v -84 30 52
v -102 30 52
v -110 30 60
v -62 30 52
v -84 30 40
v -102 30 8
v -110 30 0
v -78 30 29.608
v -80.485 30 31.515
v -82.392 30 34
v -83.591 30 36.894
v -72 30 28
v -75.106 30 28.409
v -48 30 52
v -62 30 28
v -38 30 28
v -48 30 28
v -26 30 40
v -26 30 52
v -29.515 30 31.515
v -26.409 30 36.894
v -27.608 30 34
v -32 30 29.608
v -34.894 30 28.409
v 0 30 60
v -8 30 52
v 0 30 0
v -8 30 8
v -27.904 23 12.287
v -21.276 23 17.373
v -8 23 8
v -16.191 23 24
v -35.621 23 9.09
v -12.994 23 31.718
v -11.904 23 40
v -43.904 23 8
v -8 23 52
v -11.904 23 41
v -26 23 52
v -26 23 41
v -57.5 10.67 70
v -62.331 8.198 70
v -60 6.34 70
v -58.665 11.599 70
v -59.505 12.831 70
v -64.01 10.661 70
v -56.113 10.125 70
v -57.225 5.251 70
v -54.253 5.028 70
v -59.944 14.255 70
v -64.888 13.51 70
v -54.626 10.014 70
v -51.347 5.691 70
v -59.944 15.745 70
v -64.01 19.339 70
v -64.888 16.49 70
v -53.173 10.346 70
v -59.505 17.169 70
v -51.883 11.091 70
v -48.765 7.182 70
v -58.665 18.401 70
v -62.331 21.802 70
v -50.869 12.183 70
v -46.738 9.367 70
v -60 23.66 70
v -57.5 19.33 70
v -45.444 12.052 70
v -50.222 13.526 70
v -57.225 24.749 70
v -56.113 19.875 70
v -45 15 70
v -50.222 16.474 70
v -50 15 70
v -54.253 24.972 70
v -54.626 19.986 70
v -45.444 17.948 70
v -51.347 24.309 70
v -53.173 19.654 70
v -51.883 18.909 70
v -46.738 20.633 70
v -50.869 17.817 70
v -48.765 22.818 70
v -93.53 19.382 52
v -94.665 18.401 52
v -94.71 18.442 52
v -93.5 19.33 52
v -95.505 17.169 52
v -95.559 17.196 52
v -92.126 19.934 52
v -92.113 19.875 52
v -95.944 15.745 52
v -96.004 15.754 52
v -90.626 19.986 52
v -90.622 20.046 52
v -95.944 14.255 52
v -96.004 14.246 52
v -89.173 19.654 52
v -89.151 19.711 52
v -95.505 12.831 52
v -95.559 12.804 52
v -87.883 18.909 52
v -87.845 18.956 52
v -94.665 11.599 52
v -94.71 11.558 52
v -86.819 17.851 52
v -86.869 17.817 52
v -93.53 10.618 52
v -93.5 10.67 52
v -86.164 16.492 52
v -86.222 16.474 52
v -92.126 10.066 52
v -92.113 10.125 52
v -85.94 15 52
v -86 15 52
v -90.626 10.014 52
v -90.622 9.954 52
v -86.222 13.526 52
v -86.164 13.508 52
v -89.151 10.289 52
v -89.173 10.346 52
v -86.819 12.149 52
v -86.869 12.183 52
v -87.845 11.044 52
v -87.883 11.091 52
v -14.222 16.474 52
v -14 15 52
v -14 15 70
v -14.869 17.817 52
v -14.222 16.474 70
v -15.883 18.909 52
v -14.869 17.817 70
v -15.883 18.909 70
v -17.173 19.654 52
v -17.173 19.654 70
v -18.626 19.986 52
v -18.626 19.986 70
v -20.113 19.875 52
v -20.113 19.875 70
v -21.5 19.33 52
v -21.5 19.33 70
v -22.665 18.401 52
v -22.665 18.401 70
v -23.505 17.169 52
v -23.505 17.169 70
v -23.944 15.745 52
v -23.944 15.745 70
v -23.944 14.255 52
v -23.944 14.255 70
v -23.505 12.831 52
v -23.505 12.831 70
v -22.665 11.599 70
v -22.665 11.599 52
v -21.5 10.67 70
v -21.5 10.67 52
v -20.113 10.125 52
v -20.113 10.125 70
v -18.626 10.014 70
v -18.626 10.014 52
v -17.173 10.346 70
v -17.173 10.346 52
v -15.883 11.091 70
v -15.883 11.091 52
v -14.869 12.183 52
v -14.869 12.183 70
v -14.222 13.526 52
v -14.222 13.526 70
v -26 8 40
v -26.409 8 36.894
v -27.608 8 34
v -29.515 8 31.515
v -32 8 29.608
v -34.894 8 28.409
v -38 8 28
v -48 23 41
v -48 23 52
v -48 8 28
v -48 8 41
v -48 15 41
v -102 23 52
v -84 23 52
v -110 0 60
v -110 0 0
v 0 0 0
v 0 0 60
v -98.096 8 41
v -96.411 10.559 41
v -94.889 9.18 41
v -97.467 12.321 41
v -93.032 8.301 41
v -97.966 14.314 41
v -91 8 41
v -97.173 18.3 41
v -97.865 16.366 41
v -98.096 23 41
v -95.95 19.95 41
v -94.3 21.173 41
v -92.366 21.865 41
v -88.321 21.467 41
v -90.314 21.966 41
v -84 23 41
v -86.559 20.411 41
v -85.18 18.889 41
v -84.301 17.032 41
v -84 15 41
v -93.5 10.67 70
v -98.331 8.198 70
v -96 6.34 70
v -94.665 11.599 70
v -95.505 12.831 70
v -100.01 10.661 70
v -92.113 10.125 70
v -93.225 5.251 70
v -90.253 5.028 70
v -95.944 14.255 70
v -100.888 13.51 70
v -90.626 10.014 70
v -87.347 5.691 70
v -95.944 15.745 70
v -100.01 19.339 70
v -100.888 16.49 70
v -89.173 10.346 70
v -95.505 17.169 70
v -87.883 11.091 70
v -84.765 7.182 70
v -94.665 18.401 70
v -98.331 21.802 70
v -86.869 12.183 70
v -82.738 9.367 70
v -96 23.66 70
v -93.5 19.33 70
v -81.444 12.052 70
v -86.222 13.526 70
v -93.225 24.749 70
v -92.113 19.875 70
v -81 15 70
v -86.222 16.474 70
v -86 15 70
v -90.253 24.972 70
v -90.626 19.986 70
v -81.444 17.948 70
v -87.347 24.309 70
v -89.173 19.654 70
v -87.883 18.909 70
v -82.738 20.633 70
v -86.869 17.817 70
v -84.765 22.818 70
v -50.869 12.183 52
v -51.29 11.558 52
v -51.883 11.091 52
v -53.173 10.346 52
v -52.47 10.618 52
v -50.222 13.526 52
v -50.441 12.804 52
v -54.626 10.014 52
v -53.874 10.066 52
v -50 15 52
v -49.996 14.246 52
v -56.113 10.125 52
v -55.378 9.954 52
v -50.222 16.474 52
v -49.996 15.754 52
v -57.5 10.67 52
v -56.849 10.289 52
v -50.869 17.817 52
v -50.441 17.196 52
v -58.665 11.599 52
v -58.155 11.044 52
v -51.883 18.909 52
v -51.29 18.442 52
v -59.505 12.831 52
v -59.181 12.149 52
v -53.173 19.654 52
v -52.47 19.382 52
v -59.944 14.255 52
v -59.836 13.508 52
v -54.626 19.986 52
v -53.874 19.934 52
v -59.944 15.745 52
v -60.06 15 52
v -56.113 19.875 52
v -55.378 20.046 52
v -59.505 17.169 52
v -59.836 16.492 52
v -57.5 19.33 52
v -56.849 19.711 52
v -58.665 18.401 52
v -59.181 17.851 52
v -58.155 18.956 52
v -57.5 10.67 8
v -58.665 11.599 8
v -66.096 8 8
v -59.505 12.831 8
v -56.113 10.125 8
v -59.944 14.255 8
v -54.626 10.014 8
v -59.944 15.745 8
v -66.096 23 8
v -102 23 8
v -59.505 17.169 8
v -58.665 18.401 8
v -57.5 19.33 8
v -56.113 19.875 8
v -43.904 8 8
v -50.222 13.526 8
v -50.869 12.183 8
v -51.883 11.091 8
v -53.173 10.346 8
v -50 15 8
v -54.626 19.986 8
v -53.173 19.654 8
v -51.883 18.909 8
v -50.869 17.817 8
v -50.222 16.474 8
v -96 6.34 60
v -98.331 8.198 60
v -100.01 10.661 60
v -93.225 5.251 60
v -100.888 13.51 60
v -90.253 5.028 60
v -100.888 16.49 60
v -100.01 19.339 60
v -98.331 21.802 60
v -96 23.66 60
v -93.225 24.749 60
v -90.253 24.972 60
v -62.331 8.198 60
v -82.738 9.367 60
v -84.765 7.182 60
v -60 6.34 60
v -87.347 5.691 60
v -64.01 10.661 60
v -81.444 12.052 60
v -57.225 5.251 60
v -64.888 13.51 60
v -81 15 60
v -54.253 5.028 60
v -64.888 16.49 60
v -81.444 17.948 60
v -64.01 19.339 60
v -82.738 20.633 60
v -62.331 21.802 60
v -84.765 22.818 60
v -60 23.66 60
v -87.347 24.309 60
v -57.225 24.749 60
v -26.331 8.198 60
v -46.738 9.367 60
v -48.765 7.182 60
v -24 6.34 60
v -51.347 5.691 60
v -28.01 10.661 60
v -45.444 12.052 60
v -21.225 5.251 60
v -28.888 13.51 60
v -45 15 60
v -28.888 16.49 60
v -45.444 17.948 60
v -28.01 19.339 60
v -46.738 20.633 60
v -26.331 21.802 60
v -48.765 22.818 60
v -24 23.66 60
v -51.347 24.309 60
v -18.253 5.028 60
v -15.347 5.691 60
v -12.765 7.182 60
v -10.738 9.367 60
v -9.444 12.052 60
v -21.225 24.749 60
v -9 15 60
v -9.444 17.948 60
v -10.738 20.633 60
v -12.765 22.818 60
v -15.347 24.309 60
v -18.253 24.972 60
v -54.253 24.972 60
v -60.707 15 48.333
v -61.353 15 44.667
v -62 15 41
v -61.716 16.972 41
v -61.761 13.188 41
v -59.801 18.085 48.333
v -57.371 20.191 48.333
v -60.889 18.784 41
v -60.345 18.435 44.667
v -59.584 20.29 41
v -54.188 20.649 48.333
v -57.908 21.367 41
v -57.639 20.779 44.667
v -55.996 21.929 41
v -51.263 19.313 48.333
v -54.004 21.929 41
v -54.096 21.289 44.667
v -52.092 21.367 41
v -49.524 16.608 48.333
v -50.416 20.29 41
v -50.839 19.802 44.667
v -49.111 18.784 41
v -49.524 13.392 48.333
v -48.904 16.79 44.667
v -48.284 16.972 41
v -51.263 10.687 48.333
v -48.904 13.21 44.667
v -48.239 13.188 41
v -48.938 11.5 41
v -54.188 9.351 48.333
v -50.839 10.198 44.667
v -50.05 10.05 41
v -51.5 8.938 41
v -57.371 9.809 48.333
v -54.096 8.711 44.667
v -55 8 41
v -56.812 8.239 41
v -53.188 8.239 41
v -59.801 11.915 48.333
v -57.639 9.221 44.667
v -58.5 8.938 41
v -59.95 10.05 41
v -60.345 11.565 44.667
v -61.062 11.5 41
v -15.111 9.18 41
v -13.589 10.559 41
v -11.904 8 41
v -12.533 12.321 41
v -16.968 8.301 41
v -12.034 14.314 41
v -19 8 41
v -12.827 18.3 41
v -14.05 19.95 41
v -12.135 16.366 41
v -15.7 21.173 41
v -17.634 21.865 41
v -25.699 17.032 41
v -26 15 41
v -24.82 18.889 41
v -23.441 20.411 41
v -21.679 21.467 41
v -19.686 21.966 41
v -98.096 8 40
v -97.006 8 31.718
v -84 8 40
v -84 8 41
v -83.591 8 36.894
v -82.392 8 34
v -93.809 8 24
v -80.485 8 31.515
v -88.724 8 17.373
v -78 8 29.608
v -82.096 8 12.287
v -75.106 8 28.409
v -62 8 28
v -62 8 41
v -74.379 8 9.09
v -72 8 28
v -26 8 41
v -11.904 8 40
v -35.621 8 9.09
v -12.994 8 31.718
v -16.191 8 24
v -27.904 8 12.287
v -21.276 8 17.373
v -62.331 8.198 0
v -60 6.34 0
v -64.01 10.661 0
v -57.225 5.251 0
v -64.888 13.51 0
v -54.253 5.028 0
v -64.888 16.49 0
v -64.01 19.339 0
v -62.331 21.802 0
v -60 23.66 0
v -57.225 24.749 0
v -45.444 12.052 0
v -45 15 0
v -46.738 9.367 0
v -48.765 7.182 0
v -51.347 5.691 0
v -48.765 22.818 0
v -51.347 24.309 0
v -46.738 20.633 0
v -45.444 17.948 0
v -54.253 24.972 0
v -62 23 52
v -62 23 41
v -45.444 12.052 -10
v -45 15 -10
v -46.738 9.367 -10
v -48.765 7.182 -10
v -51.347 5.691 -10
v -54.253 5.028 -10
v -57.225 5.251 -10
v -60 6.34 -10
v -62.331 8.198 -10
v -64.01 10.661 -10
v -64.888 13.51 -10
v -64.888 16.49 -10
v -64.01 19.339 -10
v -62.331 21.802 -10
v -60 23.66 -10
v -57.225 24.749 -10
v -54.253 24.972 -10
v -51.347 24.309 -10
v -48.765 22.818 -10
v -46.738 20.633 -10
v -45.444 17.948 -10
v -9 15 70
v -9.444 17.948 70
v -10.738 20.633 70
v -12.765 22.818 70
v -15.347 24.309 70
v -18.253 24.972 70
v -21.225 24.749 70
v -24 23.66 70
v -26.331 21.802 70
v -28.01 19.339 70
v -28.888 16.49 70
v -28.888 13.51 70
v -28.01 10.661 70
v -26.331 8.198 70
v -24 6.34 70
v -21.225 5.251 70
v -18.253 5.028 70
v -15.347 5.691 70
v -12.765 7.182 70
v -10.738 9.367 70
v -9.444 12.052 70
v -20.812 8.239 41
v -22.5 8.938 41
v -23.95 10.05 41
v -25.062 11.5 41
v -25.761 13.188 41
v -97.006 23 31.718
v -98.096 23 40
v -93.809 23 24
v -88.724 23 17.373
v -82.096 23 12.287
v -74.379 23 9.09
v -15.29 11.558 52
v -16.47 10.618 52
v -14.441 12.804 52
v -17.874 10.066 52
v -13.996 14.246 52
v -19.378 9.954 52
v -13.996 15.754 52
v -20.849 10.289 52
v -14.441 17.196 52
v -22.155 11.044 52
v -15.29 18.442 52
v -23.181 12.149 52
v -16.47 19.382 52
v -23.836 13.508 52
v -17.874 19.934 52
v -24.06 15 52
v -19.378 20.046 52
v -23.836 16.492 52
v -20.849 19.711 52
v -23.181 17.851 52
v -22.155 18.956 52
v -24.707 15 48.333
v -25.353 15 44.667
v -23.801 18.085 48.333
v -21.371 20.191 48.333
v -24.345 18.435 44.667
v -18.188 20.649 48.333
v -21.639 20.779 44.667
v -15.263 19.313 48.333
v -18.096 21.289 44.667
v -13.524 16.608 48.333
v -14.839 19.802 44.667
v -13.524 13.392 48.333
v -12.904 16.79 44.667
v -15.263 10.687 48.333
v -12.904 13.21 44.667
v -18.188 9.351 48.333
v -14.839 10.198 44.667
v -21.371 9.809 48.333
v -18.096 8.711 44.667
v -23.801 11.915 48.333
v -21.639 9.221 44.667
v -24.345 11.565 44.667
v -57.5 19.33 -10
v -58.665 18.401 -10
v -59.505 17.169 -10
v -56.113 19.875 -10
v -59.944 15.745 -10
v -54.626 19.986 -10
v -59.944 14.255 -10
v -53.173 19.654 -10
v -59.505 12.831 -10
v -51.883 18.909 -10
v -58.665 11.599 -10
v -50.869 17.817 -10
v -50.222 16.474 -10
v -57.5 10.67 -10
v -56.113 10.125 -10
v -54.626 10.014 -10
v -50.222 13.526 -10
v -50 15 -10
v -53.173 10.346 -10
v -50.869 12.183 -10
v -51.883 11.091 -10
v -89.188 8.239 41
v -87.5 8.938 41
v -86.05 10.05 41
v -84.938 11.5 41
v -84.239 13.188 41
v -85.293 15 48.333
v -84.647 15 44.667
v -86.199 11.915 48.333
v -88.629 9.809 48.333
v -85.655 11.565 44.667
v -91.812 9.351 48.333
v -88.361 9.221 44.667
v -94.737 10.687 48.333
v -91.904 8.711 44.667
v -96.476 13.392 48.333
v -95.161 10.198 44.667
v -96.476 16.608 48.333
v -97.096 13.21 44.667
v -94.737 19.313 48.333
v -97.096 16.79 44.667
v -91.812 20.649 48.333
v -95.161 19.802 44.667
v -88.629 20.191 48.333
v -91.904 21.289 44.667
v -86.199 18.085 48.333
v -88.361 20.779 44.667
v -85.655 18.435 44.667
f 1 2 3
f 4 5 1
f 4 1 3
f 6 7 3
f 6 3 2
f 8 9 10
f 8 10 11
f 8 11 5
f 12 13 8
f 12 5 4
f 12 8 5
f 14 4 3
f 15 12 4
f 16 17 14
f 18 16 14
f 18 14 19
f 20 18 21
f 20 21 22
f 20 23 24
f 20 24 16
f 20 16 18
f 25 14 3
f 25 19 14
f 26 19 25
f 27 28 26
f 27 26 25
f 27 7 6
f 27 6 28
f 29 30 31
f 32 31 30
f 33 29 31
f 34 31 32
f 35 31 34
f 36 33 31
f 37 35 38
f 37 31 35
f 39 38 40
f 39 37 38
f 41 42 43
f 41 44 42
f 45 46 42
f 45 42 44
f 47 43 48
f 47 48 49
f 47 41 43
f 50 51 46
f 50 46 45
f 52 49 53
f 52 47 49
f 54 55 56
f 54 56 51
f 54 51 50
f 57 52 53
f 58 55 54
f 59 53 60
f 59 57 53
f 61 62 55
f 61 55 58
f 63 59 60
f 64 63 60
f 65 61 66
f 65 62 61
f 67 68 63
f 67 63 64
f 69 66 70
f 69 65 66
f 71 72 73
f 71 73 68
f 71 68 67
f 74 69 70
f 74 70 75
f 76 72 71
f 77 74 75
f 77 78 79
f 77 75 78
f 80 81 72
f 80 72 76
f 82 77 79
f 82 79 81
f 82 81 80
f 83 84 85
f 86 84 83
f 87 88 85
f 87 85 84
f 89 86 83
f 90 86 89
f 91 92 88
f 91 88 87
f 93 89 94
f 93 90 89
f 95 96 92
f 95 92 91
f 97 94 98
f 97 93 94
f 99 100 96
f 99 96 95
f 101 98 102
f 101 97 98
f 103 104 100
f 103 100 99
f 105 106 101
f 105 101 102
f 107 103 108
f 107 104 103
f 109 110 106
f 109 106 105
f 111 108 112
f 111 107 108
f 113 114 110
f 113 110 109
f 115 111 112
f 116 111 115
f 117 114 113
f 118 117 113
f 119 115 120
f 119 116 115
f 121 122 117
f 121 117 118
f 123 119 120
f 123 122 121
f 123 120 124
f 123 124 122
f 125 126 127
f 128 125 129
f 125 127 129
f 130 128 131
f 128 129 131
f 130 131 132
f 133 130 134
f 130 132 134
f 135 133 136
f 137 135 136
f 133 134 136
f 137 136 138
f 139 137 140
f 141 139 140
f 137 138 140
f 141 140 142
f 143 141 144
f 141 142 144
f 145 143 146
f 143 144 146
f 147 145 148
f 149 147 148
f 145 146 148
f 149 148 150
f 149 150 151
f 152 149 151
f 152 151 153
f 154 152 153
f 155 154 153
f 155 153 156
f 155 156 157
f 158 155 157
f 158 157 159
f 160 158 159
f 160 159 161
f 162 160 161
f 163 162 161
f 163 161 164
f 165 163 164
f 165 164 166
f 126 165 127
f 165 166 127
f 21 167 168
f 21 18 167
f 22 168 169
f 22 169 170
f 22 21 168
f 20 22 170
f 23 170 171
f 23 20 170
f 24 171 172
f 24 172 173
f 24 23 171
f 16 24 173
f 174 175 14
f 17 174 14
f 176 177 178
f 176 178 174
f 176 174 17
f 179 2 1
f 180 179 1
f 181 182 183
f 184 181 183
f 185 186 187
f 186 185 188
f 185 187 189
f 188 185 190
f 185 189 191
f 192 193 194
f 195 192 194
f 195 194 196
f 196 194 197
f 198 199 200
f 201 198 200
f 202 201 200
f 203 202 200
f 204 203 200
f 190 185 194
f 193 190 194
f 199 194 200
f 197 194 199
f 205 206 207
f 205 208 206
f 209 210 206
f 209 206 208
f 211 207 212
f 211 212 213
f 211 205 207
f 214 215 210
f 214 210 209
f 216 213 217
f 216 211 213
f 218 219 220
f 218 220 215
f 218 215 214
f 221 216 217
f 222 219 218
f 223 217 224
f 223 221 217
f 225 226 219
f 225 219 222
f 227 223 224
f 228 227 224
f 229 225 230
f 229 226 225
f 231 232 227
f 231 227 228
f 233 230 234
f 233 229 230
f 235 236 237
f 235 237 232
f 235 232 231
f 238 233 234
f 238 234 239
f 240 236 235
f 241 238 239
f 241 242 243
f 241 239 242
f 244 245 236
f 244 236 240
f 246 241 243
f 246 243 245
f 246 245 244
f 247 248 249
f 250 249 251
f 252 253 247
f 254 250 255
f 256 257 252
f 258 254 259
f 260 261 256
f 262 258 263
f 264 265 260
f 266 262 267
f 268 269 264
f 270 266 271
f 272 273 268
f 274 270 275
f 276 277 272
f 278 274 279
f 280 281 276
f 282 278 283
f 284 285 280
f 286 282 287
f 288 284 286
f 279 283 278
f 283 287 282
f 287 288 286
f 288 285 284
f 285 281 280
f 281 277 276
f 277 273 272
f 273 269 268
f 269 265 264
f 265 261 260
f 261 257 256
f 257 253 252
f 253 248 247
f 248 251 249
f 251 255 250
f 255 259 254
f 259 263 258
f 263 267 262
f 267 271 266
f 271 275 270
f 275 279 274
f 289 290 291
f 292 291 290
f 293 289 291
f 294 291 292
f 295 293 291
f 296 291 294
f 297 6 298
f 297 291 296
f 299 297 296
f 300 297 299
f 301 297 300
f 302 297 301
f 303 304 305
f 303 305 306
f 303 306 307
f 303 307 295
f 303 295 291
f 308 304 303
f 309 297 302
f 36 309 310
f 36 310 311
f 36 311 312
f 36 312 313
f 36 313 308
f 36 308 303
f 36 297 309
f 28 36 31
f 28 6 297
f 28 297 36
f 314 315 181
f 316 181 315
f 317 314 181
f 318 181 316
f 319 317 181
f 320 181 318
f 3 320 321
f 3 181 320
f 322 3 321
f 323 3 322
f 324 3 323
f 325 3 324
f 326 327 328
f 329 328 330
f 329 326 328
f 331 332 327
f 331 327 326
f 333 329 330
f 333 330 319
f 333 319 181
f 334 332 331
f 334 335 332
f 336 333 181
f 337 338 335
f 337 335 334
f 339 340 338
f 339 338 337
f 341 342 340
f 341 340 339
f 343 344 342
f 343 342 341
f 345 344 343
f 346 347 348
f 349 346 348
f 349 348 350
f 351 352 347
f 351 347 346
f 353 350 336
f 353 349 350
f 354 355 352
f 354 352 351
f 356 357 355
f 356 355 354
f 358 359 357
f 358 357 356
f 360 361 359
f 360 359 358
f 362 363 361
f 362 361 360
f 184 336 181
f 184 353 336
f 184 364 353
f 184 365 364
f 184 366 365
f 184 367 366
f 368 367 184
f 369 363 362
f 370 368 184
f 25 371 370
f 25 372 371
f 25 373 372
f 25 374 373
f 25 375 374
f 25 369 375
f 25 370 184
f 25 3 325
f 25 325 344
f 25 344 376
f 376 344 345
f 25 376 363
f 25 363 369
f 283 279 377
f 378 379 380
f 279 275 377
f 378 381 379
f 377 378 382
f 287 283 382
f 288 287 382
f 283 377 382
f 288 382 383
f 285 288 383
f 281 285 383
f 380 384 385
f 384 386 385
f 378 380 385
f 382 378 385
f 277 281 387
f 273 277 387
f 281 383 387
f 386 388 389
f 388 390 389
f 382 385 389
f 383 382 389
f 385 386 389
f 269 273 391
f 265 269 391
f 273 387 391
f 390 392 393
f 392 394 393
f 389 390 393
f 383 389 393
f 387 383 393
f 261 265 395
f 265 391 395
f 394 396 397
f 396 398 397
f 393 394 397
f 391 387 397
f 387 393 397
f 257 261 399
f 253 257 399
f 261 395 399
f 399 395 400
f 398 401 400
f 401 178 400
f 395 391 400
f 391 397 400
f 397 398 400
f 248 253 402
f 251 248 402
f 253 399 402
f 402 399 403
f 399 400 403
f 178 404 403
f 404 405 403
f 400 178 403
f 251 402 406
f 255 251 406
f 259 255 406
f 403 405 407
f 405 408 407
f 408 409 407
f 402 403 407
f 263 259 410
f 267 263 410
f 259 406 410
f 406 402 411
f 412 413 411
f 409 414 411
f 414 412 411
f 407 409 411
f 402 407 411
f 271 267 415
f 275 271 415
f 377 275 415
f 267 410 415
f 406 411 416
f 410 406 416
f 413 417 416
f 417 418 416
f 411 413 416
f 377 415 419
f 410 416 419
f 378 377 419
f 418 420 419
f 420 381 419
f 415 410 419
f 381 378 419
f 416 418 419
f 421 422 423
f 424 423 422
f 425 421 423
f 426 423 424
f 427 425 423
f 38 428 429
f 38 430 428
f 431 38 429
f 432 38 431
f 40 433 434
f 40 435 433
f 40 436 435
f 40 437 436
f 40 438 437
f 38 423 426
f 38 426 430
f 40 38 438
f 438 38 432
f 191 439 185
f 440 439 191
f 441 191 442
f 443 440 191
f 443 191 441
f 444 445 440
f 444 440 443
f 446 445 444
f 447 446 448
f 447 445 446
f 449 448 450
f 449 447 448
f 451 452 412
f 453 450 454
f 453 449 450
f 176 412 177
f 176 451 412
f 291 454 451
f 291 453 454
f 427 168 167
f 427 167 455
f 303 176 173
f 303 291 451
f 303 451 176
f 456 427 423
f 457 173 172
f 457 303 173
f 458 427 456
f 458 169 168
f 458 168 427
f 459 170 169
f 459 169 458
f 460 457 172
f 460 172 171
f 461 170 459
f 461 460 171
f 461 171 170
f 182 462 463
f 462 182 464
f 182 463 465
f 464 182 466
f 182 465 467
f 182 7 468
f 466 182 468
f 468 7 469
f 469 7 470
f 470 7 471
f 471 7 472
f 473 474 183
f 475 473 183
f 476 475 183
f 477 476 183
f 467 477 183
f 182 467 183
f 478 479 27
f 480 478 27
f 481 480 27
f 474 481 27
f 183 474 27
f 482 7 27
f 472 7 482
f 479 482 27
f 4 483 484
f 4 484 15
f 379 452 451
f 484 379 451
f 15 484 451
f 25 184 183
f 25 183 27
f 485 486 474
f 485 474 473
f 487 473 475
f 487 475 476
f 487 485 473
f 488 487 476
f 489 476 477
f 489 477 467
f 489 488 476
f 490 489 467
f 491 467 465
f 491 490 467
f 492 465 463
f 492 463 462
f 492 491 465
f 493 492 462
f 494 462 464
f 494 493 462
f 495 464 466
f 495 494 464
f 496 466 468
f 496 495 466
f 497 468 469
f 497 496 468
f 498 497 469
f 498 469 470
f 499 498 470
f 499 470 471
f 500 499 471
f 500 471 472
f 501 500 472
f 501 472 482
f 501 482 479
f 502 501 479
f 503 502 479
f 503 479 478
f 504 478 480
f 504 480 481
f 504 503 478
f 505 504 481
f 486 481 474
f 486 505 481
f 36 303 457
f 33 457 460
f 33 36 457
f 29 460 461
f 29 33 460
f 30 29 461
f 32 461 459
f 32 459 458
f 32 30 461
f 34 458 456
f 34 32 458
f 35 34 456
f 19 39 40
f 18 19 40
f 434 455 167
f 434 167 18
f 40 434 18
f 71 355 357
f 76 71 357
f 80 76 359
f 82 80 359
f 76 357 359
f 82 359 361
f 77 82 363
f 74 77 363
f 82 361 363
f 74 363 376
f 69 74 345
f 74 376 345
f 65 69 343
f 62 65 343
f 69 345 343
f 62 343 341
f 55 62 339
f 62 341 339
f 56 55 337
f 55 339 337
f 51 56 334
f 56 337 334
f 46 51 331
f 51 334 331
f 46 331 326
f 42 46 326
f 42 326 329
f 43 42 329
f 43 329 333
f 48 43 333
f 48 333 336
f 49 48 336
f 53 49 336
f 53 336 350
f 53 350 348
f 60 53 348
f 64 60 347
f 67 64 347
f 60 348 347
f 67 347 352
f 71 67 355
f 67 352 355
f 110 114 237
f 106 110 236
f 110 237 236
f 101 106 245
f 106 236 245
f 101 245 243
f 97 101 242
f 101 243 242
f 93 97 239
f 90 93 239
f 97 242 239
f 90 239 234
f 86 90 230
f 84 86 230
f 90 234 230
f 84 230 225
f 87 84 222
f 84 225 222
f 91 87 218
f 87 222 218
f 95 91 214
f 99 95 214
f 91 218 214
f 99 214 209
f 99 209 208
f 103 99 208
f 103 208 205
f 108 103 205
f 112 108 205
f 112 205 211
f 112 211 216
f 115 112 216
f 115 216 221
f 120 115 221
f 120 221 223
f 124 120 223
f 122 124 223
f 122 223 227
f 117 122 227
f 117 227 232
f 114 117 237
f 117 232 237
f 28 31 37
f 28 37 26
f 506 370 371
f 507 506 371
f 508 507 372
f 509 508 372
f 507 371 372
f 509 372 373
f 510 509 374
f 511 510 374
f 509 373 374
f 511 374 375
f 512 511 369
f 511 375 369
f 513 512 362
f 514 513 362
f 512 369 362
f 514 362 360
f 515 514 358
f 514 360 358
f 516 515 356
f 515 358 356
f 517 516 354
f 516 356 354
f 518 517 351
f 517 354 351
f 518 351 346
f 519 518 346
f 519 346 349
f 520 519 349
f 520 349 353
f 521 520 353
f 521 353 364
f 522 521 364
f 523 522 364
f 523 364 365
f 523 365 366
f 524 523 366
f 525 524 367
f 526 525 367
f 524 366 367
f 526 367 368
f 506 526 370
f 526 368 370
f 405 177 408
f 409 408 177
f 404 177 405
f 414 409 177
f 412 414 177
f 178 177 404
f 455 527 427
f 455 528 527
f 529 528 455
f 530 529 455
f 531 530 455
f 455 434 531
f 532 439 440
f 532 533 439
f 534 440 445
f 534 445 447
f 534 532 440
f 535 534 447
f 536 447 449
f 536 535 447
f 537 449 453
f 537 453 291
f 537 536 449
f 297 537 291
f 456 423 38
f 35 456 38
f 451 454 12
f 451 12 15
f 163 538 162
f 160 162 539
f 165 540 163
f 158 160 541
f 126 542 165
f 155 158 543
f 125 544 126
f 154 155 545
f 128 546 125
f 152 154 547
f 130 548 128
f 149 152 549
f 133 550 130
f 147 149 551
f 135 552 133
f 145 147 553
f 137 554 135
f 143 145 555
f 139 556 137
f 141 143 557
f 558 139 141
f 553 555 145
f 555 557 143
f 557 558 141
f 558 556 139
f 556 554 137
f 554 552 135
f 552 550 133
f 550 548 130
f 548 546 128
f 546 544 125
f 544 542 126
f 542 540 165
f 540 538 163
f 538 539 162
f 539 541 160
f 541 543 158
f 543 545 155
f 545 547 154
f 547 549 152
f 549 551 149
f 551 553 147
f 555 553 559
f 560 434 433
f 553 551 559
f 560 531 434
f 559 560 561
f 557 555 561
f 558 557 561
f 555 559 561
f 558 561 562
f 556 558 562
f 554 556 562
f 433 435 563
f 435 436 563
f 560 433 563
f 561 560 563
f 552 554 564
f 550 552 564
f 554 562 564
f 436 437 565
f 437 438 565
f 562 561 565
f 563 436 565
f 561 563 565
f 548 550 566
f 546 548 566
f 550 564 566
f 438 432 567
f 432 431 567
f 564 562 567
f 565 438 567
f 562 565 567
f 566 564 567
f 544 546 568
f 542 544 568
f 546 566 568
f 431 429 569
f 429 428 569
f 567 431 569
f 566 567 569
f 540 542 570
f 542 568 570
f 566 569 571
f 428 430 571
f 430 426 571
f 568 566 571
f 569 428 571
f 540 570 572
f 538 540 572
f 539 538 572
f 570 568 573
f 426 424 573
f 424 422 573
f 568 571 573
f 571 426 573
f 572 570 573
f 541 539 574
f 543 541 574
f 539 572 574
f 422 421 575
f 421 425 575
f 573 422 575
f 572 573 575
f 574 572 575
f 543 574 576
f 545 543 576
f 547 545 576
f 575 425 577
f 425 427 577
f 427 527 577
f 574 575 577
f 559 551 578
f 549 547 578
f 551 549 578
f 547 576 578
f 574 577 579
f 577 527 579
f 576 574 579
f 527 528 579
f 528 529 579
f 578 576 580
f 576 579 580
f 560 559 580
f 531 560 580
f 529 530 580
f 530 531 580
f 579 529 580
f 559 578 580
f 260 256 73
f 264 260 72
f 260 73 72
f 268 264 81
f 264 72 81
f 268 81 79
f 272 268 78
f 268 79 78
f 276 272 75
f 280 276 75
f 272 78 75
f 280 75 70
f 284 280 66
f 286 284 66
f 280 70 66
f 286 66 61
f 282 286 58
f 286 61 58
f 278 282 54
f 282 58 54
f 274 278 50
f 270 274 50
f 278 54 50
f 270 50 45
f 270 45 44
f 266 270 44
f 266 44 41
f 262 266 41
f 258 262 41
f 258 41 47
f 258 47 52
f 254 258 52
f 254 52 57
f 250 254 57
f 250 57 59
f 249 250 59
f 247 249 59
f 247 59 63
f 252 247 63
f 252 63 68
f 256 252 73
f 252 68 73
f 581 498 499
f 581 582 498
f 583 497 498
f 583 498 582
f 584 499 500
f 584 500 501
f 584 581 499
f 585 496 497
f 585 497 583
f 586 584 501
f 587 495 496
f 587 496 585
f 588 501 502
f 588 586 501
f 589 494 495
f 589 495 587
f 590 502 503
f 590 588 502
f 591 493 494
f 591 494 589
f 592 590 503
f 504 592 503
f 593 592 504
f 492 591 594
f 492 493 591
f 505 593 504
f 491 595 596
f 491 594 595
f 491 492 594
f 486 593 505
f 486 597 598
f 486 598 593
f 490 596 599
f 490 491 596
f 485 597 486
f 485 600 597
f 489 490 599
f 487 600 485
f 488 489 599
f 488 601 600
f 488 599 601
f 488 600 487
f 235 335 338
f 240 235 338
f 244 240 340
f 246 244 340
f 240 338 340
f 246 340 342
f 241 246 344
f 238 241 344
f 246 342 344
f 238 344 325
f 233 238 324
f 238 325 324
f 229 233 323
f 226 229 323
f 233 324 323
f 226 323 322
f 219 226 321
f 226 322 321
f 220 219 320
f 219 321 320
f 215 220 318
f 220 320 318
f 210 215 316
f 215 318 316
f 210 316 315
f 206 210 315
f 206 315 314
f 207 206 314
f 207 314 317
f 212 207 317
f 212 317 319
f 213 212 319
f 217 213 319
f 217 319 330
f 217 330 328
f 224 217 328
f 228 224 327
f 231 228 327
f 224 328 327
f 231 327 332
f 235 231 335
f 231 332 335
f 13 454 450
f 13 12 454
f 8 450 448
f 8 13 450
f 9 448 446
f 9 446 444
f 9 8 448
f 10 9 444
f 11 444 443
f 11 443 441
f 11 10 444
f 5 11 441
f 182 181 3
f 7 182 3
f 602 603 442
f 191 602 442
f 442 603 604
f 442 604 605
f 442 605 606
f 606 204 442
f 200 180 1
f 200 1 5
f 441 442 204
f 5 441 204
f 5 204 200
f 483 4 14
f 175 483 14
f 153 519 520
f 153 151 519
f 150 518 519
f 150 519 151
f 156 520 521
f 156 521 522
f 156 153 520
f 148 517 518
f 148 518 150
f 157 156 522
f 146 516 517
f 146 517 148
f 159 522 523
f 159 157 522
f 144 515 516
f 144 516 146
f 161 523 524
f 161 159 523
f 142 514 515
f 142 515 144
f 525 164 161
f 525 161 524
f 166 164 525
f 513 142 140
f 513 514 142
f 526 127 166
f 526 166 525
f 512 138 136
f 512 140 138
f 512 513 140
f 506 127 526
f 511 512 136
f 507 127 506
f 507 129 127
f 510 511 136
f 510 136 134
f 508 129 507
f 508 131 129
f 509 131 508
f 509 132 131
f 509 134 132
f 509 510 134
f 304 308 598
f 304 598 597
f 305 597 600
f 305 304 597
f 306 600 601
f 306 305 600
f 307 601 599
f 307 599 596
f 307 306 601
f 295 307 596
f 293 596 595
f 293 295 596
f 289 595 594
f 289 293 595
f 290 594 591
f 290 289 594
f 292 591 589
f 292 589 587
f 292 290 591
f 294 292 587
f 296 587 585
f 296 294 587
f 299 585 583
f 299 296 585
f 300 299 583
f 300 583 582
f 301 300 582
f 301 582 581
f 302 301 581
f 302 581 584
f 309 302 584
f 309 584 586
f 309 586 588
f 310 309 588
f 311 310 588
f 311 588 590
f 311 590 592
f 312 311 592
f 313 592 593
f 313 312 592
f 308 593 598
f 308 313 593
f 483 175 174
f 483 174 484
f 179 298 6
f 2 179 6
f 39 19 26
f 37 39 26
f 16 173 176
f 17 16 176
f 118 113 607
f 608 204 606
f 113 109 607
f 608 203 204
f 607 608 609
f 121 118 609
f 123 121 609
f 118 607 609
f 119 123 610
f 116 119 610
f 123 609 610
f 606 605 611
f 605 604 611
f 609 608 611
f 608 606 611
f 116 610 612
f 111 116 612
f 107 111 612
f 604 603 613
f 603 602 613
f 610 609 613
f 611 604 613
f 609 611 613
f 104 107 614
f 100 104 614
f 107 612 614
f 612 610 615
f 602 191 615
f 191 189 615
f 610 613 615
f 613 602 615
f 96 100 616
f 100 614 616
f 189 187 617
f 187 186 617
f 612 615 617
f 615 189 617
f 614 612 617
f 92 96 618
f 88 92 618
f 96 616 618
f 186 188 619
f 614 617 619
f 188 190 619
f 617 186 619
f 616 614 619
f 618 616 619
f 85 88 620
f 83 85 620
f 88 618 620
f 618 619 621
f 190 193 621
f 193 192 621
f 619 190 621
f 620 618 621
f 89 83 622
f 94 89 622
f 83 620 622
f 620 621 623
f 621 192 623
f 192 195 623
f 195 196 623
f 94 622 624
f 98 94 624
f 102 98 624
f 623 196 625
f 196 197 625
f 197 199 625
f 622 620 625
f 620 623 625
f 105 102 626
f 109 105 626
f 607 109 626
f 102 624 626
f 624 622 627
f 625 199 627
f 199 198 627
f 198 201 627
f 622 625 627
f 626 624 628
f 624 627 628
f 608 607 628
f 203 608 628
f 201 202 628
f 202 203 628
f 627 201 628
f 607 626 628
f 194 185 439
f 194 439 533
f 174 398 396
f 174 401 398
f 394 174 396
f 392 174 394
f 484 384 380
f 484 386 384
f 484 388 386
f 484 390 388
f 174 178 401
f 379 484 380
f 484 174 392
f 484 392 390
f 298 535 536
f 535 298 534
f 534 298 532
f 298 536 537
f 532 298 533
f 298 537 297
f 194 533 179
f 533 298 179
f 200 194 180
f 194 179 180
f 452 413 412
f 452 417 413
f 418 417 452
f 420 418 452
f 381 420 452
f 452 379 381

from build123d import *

# Parameters (mm, degrees)
SKETCH1_W               = 110
SKETCH1_H               = 30
BOSS_EXTRUDE1_DEPTH     = 60
SKETCH5_R               = 10
BOSS_EXTRUDE3_DEPTH     = 10
SKETCH8_R               = 5
CUT_EXTRUDE2_DEPTH      = 18
BOSS_EXTRUDE4_START     = 10
SKETCH6_R               = 10
BOSS_EXTRUDE4_DEPTH     = 10
CUT_EXTRUDE3_START      = -18
SKETCH7_R               = 5
CUT_EXTRUDE3_DEPTH      = 18
SHELL6_START            = 8
SHELL6_OUTLINE_W        = 94
SHELL6_OUTLINE_H        = 22
SHELL6_DEPTH            = 44
SKETCH9_W               = 22
SKETCH9_H               = 24
BOSS_EXTRUDE5_DEPTH     = 22
FILLET2_R               = 12
SKETCH12_W              = 14
SKETCH12_H              = 16
BOSS_EXTRUDE8_DEPTH     = 11
SKETCH13_R              = 7
CUT_EXTRUDE4_DEPTH      = 11
CUT_EXTRUDE4_DRAFT      = -10
SKETCH14_W              = 18
SKETCH14_H              = 15
BOSS_EXTRUDE9_DEPTH     = 11
SKETCH16_R              = 7
CUT_EXTRUDE5_DEPTH      = 11
CUT_EXTRUDE5_DRAFT      = -10
SKETCH19_W              = 3.903707596
SKETCH19_H              = 15
BOSS_EXTRUDE11_DEPTH    = 33.5
FILLET3_R               = 32
MIRROR5_COPY_1_SKETCH_R = 7
MIRROR5_COPY_1_DEPTH    = 11
MIRROR5_COPY_1_DRAFT    = -10
FILLET3_OF_MIRROR5_R    = 32


# Read off the part's stored shape, not the designer's step: Shell6
with BuildPart() as part:
    # Sketch1 → Boss-Extrude1 (new body)
    with BuildSketch(Plane.XY):
        with Locations((-55, 15)):
            Rectangle(SKETCH1_W, SKETCH1_H)
    extrude(amount=BOSS_EXTRUDE1_DEPTH)

    # Sketch5 → Boss-Extrude3 (add)
    with BuildSketch(Plane.XY.offset(60)):
        with Locations((-91, 15)):
            Circle(SKETCH5_R)
        with Locations((-55, 15)):
            Circle(SKETCH5_R)
        with Locations((-19, 15)):
            Circle(SKETCH5_R)
    extrude(amount=BOSS_EXTRUDE3_DEPTH)

    # Sketch8 → Cut-Extrude2 (cut)
    with BuildSketch(Plane.XY.offset(70)):
        with Locations((-91, 15)):
            Circle(SKETCH8_R)
        with Locations((-55, 15)):
            Circle(SKETCH8_R)
        with Locations((-19, 15)):
            Circle(SKETCH8_R)
    extrude(amount=-CUT_EXTRUDE2_DEPTH, mode=Mode.SUBTRACT)

    # Sketch6 → Boss-Extrude4 (add)
    with BuildSketch(Plane(origin=(0, 0, 0), x_dir=(-1, 0, 0), z_dir=(0, 0, -1)).offset(BOSS_EXTRUDE4_START)):
        with Locations(Location((55, 15, 0), (0, 0, 180))):
            Circle(SKETCH6_R)
    extrude(amount=-BOSS_EXTRUDE4_DEPTH)

    # Sketch7 → Cut-Extrude3 (cut)
    with BuildSketch(Plane(origin=(0, 0, -10), x_dir=(-1, 0, 0), z_dir=(0, 0, -1)).offset(CUT_EXTRUDE3_START)):
        with Locations(Location((55, 15, 0), (0, 0, 180))):
            Circle(SKETCH7_R)
    extrude(amount=CUT_EXTRUDE3_DEPTH, mode=Mode.SUBTRACT)

    # Shell6 outline → Shell6 (cut)
    with BuildSketch(Plane.XY.offset(SHELL6_START)):
        with Locations((-55, 19)):
            Rectangle(SHELL6_OUTLINE_W, SHELL6_OUTLINE_H)
    extrude(amount=SHELL6_DEPTH, mode=Mode.SUBTRACT)

    # Sketch9 → Boss-Extrude5 (add)
    with BuildSketch(Plane(origin=(0, 8, 0), x_dir=(1, 0, 0), z_dir=(0, 1, 0))):
        with Locations((-73, -40)):
            Rectangle(SKETCH9_W, SKETCH9_H)
    boss_extrude5 = extrude(amount=BOSS_EXTRUDE5_DEPTH)

    # Mirror1: Boss-Extrude5 across plane
    add(boss_extrude5.mirror(Plane.ZY.offset(55)))

    # Fillet2
    fillet2_edges = [part.edges().sort_by_distance(p)[0] for p in [
        (-84, 19, 28),
        (-26, 19, 28),
    ]]
    fillet(fillet2_edges, radius=FILLET2_R)

    # Sketch12 → Boss-Extrude8 (add)
    with BuildSketch(Plane(origin=(0, 0, 52), x_dir=(-1, 0, 0), z_dir=(0, 0, -1))):
        with Locations((55, 15)):
            Rectangle(SKETCH12_W, SKETCH12_H)
    extrude(amount=BOSS_EXTRUDE8_DEPTH)


with BuildPart() as cut_extrude4_tool:
    # Sketch13 → Cut-Extrude4 (with draft: the straight prism first)
    with BuildSketch(Plane(origin=(0, 0, 41), x_dir=(-1, 0, 0), z_dir=(0, 0, -1))):
        with Locations((55, 15)):
            Circle(SKETCH13_R)
    extrude(amount=-CUT_EXTRUDE4_DEPTH)
    # Cut-Extrude4: the draft: its side faces are tilted about the plane it starts from
    cut_extrude4_sides = [cut_extrude4_tool.faces().sort_by_distance(p)[0] for p in [
        (-48, 15, 46.5),
    ]]
    draft(cut_extrude4_sides, Plane(origin=(0, 0, 41), x_dir=(-1, 0, 0), z_dir=(0, 0, -1)), CUT_EXTRUDE4_DRAFT)


with BuildPart() as part_1:
    add(part.part)

    # Cut-Extrude4: cut by cut_extrude4_tool
    add(cut_extrude4_tool.part, mode=Mode.SUBTRACT)

    # Sketch14 → Boss-Extrude9 (add)
    with BuildSketch(Plane(origin=(0, 0, 52), x_dir=(-1, 0, 0), z_dir=(0, 0, -1))):
        with Locations((17, 15.5)):
            Rectangle(SKETCH14_W, SKETCH14_H)
    boss_extrude9 = extrude(amount=BOSS_EXTRUDE9_DEPTH)


with BuildPart() as cut_extrude5_tool:
    # Sketch16 → Cut-Extrude5 (with draft: the straight prism first)
    with BuildSketch(Plane(origin=(0, 0, 41), x_dir=(-1, 0, 0), z_dir=(0, 0, -1))):
        with Locations((19, 15)):
            Circle(SKETCH16_R)
    extrude(amount=-CUT_EXTRUDE5_DEPTH)
    # Cut-Extrude5: the draft: its side faces are tilted about the plane it starts from
    cut_extrude5_sides = [cut_extrude5_tool.faces().sort_by_distance(p)[0] for p in [
        (-12, 15, 46.5),
    ]]
    draft(cut_extrude5_sides, Plane(origin=(0, 0, 41), x_dir=(-1, 0, 0), z_dir=(0, 0, -1)), CUT_EXTRUDE5_DRAFT)


with BuildPart() as part_2:
    add(part_1.part)

    # Cut-Extrude5: cut by cut_extrude5_tool
    add(cut_extrude5_tool.part, mode=Mode.SUBTRACT)

    # Sketch19 → Boss-Extrude11 (add)
    with BuildSketch(Plane(origin=(0, 0, 41), x_dir=(-1, 0, 0), z_dir=(0, 0, -1))):
        with Locations((9.951853798, 15.5)):
            Rectangle(SKETCH19_W, SKETCH19_H)
    boss_extrude11 = extrude(amount=BOSS_EXTRUDE11_DEPTH)

    # Fillet3
    fillet3_edges = [part_2.edges().sort_by_distance(p)[0] for p in [
        (-11.903707596, 15.5, 8),
    ]]
    fillet(fillet3_edges, radius=FILLET3_R)

    # Mirror5: Boss-Extrude9, Boss-Extrude11 across plane
    add(boss_extrude9.mirror(Plane.ZY.offset(55)))
    add(boss_extrude11.mirror(Plane.ZY.offset(55)))


with BuildPart() as mirror5_copy_1_tool:
    # Mirror5 copy 1 sketch → Mirror5 copy 1 (with draft: the straight prism first)
    with BuildSketch(Plane(origin=(-110, 0, 41), x_dir=(1, 0, 0), z_dir=(0, 0, -1))):
        with Locations((19, -15)):
            Circle(MIRROR5_COPY_1_SKETCH_R)
    extrude(amount=-MIRROR5_COPY_1_DEPTH)
    # Mirror5 copy 1: the draft: its side faces are tilted about the plane it starts from
    mirror5_copy_1_sides = [mirror5_copy_1_tool.faces().sort_by_distance(p)[0] for p in [
        (-98, 15, 46.5),
    ]]
    draft(mirror5_copy_1_sides, Plane(origin=(-110, 0, 41), x_dir=(1, 0, 0), z_dir=(0, 0, -1)), MIRROR5_COPY_1_DRAFT)


with BuildPart() as part_3:
    add(part_2.part)

    # Mirror5 copy 1: cut by mirror5_copy_1_tool
    add(mirror5_copy_1_tool.part, mode=Mode.SUBTRACT)

    # Fillet3 of Mirror5
    fillet3_of_mirror5_edges = [part_3.edges().sort_by_distance(p)[0] for p in [
        (-98.096292404, 15.5, 8),
    ]]
    fillet(fillet3_of_mirror5_edges, radius=FILLET3_OF_MIRROR5_R)


solid = part_3.part
